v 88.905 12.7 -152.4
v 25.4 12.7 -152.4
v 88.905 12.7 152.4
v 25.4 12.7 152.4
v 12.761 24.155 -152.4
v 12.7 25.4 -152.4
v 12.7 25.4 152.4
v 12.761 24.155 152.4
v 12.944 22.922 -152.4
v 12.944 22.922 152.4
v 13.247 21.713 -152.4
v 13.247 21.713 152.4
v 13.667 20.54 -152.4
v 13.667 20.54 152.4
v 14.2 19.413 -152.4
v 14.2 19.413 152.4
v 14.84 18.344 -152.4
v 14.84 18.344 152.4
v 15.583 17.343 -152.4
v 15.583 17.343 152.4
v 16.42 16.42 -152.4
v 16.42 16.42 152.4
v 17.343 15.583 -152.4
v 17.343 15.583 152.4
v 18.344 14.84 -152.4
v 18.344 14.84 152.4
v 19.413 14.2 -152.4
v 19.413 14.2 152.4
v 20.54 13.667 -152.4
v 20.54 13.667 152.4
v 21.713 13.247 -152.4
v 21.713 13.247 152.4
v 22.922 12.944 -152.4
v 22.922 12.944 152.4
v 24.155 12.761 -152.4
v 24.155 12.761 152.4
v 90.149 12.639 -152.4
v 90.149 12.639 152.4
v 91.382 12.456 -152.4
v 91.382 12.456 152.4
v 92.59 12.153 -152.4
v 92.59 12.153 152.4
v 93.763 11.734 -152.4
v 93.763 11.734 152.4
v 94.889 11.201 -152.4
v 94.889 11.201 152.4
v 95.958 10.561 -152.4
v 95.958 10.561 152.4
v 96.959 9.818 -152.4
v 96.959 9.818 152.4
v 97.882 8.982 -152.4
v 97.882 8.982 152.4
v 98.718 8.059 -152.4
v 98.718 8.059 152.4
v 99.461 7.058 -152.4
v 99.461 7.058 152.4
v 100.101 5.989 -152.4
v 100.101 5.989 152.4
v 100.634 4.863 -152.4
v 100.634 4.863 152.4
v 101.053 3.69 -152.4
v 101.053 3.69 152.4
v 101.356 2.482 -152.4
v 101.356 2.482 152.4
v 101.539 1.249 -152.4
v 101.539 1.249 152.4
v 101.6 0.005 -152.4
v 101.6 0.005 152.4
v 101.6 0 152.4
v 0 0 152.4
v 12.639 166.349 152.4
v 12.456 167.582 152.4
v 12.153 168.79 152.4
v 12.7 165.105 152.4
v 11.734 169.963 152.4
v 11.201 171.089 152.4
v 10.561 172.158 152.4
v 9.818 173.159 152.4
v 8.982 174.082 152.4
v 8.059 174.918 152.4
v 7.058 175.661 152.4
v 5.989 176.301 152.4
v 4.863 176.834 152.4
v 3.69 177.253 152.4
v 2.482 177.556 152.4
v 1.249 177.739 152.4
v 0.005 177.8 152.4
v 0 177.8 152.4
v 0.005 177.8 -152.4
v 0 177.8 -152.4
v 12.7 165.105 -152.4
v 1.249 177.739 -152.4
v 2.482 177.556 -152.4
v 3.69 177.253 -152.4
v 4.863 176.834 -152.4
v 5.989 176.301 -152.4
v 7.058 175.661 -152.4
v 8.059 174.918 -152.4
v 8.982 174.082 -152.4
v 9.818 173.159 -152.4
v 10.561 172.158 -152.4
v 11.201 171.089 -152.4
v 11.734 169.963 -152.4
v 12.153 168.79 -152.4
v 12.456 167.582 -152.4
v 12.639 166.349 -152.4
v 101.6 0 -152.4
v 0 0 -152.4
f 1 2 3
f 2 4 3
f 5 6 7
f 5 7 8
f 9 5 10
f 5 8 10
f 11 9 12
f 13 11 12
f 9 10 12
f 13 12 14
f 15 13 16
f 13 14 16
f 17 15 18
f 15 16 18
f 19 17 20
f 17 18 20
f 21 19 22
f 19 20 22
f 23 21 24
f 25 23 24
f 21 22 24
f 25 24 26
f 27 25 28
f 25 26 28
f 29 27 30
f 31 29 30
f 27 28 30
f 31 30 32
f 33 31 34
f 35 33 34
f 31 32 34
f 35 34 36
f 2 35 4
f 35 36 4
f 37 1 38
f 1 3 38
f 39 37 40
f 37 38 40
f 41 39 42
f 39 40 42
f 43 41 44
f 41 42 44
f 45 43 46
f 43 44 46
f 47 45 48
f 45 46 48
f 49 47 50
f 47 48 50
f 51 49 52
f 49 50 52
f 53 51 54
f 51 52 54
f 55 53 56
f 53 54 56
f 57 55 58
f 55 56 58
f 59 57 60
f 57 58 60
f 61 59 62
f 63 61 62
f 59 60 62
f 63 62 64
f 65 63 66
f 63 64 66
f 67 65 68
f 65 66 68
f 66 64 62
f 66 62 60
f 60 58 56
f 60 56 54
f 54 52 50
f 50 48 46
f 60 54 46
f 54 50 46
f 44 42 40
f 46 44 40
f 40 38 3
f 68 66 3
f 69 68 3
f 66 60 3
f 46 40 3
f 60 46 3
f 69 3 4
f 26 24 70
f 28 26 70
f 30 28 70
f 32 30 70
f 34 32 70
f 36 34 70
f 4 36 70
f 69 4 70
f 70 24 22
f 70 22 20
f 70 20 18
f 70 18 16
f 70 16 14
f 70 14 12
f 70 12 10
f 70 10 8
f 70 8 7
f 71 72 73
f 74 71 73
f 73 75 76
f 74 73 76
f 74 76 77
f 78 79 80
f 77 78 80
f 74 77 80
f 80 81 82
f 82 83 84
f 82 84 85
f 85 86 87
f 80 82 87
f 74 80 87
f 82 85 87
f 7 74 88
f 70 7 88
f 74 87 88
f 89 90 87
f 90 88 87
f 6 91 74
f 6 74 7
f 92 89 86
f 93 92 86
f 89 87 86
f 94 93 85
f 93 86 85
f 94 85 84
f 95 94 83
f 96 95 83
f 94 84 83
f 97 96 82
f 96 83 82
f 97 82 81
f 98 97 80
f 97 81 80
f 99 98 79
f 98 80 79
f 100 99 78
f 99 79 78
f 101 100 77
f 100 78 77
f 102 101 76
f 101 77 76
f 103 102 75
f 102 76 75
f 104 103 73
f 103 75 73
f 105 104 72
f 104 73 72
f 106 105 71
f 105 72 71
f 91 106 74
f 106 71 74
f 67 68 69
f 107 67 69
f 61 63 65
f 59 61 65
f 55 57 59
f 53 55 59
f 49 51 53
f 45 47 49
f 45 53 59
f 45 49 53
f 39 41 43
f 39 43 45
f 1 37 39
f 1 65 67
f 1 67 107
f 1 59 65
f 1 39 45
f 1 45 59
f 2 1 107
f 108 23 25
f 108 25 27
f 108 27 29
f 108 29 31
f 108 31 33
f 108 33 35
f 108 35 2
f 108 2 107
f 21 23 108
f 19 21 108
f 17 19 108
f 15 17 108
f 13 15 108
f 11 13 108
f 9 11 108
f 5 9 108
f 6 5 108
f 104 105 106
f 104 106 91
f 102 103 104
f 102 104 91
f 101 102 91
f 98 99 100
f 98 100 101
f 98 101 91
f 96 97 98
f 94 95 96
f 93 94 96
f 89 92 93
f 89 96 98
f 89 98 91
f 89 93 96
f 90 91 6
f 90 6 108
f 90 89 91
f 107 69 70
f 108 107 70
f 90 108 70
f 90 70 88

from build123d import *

# Parameters (mm, degrees)
BOSS_EXTRUDE2_DEPTH = 152.4


with BuildPart() as part:
    # Sketch2 → Boss-Extrude2 (new body, symmetric)
    with BuildSketch(Plane.XY):
        with BuildLine():
            Line((0, 0), (0, 177.8))
            Line((0, 177.8), (0.00508, 177.8))
            ThreePointArc((0.00508, 177.8), (8.981744019, 174.081744019), (12.7, 165.10508))
            Line((12.7, 165.10508), (12.7, 25.4))
            ThreePointArc((12.7, 25.4), (16.419743879, 16.419743879), (25.4, 12.7))
            Line((25.4, 12.7), (88.90508, 12.7))
            ThreePointArc((88.90508, 12.7), (97.881744019, 8.981744019), (101.6, 0.00508))
            Line((101.6, 0.00508), (101.6, 0))
            Line((101.6, 0), (0, 0))
        make_face()
    extrude(amount=BOSS_EXTRUDE2_DEPTH, both=True)


solid = part.part
